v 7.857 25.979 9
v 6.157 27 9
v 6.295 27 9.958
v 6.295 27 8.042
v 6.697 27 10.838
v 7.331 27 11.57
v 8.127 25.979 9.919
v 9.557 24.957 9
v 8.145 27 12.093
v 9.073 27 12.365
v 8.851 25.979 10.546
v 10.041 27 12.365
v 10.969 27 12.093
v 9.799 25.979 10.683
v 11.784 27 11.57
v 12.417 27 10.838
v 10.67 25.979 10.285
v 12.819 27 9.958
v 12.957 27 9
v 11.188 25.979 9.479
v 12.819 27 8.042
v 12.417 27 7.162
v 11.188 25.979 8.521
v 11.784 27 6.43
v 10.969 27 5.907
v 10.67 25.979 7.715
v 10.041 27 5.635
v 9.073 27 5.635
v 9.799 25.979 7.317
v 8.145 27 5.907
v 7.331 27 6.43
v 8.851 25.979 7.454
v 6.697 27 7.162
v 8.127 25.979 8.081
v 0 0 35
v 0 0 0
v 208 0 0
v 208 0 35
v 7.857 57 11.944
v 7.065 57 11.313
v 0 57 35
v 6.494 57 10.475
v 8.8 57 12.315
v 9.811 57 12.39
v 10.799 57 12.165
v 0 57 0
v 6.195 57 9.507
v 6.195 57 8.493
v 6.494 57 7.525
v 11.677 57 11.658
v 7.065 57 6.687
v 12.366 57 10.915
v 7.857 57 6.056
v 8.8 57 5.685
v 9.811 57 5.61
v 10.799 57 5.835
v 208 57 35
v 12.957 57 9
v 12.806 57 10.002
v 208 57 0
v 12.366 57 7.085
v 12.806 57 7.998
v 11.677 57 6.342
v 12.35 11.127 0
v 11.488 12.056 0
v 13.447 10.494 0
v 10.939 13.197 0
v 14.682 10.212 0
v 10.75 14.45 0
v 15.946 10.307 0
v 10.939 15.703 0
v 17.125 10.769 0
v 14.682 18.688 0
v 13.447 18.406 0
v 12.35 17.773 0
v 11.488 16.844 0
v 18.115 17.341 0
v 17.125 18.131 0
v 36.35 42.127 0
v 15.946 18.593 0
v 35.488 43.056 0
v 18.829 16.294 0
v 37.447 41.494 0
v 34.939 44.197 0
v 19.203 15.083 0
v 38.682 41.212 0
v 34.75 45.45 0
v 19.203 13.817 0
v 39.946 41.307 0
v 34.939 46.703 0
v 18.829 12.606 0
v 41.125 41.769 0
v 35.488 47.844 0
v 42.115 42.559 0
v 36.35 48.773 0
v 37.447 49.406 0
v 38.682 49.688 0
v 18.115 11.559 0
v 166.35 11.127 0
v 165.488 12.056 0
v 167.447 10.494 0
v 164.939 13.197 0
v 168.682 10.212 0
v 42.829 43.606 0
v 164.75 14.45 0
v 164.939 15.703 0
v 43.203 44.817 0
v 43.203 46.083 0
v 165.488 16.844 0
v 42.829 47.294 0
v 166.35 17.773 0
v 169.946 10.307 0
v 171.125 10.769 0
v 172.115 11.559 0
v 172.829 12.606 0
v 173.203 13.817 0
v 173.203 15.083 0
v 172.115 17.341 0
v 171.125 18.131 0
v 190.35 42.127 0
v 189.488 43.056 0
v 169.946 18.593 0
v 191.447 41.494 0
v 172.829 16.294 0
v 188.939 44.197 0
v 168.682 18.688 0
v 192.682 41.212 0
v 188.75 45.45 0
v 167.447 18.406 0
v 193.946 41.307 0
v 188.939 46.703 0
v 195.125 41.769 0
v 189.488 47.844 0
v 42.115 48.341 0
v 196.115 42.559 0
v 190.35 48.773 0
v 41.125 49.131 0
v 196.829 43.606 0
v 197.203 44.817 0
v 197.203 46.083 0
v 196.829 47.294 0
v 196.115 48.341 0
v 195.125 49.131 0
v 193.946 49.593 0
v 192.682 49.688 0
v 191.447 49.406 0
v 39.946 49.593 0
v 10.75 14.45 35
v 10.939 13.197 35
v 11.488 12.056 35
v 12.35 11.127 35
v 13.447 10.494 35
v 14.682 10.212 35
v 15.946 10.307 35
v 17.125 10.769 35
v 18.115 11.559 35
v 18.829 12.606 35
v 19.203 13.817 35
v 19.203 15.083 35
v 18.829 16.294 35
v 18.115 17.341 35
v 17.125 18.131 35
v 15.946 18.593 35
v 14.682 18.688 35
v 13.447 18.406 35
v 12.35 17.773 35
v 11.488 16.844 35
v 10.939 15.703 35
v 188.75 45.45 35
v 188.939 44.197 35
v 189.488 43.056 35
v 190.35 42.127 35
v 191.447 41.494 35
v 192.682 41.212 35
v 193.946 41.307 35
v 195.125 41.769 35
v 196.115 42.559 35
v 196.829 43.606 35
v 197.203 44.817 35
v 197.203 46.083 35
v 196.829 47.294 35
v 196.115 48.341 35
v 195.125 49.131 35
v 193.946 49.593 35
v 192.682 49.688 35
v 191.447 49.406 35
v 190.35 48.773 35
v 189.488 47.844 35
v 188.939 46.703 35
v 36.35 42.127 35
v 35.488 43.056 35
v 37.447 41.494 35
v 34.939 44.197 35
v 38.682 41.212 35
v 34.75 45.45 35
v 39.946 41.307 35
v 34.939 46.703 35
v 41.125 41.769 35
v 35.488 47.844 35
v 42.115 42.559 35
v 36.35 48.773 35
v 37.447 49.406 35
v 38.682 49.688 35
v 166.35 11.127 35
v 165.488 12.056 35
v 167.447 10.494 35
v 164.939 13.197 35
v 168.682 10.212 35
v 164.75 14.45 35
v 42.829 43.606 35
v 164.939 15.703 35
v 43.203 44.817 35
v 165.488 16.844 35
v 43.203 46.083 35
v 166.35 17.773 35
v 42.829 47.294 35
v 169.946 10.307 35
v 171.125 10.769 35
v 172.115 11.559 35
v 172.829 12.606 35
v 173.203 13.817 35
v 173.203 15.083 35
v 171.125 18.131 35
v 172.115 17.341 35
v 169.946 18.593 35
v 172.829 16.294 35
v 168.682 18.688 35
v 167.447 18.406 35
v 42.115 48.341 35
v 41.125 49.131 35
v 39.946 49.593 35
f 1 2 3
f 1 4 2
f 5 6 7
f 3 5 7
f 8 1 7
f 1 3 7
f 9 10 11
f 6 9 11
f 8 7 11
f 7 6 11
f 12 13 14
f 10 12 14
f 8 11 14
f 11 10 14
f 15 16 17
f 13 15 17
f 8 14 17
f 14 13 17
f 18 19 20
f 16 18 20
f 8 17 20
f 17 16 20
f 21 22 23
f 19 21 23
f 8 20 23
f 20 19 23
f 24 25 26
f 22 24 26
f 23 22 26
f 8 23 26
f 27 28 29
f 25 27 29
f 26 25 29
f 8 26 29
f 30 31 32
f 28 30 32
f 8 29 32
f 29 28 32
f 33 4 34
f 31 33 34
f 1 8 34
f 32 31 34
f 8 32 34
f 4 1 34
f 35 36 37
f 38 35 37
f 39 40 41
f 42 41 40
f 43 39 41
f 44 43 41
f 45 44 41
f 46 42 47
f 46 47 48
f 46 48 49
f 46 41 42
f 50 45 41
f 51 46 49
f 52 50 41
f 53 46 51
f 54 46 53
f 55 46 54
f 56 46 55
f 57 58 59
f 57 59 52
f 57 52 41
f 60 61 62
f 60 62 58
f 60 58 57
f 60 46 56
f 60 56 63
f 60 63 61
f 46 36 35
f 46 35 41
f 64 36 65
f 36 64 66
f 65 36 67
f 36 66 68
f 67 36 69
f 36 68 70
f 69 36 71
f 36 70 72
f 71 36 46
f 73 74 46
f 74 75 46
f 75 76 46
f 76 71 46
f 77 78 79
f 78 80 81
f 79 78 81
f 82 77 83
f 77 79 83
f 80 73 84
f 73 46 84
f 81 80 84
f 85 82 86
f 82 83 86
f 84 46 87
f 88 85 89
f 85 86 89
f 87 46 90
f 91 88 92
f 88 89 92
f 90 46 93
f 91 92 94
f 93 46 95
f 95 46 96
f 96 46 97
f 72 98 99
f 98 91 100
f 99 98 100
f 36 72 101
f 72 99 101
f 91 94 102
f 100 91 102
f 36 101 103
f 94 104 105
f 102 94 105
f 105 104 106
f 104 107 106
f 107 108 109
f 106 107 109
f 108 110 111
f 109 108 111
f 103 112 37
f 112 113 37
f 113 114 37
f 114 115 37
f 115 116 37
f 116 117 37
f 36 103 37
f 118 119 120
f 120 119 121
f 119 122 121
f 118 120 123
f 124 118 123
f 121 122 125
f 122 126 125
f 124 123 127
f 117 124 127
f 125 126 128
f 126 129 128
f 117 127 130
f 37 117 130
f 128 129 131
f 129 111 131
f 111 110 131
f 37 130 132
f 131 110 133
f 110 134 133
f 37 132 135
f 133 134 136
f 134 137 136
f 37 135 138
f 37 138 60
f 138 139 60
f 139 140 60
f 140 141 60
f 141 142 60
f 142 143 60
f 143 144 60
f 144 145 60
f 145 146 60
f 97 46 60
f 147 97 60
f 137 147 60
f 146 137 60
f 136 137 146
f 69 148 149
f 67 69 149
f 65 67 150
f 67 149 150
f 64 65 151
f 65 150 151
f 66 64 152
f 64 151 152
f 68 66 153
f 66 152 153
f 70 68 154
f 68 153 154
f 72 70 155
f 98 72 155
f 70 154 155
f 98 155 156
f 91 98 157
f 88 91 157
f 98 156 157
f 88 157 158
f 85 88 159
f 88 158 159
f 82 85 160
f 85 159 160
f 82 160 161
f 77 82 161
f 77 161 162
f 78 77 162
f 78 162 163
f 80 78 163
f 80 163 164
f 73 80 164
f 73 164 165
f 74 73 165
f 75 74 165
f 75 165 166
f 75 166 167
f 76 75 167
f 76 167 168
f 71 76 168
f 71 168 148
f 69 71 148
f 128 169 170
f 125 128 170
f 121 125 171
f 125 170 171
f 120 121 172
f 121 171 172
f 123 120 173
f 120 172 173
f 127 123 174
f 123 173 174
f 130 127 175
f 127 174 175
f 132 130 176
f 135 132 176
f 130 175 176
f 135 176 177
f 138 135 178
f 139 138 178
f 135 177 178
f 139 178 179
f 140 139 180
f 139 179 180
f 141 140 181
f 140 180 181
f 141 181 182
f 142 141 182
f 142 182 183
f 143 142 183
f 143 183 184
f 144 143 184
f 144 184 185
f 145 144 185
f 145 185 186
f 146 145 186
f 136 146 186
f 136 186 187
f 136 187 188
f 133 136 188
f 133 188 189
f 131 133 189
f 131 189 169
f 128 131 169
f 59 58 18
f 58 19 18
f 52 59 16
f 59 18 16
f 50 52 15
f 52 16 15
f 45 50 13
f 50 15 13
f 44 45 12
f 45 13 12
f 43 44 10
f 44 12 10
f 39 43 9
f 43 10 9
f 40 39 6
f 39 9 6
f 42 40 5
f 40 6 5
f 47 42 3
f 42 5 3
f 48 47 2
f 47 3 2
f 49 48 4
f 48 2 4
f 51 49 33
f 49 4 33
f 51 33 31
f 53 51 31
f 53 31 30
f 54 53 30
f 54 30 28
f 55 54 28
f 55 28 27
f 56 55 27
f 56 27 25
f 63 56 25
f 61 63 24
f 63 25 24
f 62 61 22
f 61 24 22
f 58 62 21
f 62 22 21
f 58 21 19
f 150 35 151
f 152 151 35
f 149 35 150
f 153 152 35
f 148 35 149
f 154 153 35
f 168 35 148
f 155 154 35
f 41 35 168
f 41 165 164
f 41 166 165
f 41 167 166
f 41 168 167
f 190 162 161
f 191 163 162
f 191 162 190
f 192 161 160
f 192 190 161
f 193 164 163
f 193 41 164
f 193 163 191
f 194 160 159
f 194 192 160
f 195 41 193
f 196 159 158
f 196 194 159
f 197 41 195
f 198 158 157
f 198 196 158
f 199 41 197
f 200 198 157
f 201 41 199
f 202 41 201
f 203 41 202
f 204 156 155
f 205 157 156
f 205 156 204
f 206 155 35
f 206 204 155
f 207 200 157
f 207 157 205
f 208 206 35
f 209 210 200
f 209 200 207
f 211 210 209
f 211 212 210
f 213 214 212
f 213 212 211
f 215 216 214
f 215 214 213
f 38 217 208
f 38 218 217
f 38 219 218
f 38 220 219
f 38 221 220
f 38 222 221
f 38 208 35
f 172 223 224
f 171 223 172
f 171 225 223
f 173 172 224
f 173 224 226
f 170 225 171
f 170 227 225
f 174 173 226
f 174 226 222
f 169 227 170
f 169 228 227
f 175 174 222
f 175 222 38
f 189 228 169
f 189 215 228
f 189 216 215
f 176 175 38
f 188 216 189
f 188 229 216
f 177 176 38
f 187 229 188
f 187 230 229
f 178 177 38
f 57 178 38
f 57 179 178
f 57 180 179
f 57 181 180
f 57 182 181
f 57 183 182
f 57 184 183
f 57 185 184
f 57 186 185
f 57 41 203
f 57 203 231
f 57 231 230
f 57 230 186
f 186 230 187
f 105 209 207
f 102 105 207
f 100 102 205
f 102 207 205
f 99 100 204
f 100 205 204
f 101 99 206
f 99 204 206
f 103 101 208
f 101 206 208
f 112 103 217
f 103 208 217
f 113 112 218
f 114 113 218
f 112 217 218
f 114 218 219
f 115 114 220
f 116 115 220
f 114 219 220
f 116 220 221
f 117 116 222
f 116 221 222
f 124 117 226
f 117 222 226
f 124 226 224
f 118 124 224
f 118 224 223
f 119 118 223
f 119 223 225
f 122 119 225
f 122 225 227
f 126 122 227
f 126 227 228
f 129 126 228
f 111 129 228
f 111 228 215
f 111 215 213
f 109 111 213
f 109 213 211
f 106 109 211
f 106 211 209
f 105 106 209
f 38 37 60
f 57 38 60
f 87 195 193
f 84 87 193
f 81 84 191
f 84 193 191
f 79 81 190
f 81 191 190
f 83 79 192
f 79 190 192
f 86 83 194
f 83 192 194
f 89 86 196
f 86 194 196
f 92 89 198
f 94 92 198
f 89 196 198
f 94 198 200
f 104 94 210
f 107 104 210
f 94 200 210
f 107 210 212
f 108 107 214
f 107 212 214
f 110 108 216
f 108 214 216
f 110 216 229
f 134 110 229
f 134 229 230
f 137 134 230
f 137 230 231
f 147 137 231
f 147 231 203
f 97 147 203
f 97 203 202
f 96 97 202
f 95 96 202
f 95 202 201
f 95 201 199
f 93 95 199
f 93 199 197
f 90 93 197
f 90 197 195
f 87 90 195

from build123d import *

# Parameters (mm, degrees)
F0_W     = 208
F0_H     = 57
F1_DEPTH = 35
F3_D     = 6.8
F3_DEPTH = 30
F3_TIP   = 2.0429261047
F4_D     = 8.5


with BuildPart() as f1:
    # F0 (on Top) → F1 (new body)
    with BuildSketch(Plane.XY):
        with Locations((104, 28.5)):
            Rectangle(F0_W, F0_H)
    extrude(amount=F1_DEPTH)

    # F3
    with Locations(Plane(origin=(0, 57, 0), x_dir=(-1, 0, 0), z_dir=(0, 1, 0))):
        with Locations((-9.5570590347, 9)):
            Hole(F3_D / 2, depth=F3_DEPTH)
            with Locations((0, 0, -(F3_DEPTH + F3_TIP / 2))):  # 118° drill point
                Cone(0, F3_D / 2, F3_TIP, mode=Mode.SUBTRACT)

    # F4 (through all)
    with Locations(Plane(origin=(0, 0, 0), x_dir=(1, 0, 0), z_dir=(0, 0, -1))):
        with Locations((193, -45.45), (169, -14.45), (39, -45.45), (15, -14.45)):
            Hole(F4_D / 2)


solid = f1.part
